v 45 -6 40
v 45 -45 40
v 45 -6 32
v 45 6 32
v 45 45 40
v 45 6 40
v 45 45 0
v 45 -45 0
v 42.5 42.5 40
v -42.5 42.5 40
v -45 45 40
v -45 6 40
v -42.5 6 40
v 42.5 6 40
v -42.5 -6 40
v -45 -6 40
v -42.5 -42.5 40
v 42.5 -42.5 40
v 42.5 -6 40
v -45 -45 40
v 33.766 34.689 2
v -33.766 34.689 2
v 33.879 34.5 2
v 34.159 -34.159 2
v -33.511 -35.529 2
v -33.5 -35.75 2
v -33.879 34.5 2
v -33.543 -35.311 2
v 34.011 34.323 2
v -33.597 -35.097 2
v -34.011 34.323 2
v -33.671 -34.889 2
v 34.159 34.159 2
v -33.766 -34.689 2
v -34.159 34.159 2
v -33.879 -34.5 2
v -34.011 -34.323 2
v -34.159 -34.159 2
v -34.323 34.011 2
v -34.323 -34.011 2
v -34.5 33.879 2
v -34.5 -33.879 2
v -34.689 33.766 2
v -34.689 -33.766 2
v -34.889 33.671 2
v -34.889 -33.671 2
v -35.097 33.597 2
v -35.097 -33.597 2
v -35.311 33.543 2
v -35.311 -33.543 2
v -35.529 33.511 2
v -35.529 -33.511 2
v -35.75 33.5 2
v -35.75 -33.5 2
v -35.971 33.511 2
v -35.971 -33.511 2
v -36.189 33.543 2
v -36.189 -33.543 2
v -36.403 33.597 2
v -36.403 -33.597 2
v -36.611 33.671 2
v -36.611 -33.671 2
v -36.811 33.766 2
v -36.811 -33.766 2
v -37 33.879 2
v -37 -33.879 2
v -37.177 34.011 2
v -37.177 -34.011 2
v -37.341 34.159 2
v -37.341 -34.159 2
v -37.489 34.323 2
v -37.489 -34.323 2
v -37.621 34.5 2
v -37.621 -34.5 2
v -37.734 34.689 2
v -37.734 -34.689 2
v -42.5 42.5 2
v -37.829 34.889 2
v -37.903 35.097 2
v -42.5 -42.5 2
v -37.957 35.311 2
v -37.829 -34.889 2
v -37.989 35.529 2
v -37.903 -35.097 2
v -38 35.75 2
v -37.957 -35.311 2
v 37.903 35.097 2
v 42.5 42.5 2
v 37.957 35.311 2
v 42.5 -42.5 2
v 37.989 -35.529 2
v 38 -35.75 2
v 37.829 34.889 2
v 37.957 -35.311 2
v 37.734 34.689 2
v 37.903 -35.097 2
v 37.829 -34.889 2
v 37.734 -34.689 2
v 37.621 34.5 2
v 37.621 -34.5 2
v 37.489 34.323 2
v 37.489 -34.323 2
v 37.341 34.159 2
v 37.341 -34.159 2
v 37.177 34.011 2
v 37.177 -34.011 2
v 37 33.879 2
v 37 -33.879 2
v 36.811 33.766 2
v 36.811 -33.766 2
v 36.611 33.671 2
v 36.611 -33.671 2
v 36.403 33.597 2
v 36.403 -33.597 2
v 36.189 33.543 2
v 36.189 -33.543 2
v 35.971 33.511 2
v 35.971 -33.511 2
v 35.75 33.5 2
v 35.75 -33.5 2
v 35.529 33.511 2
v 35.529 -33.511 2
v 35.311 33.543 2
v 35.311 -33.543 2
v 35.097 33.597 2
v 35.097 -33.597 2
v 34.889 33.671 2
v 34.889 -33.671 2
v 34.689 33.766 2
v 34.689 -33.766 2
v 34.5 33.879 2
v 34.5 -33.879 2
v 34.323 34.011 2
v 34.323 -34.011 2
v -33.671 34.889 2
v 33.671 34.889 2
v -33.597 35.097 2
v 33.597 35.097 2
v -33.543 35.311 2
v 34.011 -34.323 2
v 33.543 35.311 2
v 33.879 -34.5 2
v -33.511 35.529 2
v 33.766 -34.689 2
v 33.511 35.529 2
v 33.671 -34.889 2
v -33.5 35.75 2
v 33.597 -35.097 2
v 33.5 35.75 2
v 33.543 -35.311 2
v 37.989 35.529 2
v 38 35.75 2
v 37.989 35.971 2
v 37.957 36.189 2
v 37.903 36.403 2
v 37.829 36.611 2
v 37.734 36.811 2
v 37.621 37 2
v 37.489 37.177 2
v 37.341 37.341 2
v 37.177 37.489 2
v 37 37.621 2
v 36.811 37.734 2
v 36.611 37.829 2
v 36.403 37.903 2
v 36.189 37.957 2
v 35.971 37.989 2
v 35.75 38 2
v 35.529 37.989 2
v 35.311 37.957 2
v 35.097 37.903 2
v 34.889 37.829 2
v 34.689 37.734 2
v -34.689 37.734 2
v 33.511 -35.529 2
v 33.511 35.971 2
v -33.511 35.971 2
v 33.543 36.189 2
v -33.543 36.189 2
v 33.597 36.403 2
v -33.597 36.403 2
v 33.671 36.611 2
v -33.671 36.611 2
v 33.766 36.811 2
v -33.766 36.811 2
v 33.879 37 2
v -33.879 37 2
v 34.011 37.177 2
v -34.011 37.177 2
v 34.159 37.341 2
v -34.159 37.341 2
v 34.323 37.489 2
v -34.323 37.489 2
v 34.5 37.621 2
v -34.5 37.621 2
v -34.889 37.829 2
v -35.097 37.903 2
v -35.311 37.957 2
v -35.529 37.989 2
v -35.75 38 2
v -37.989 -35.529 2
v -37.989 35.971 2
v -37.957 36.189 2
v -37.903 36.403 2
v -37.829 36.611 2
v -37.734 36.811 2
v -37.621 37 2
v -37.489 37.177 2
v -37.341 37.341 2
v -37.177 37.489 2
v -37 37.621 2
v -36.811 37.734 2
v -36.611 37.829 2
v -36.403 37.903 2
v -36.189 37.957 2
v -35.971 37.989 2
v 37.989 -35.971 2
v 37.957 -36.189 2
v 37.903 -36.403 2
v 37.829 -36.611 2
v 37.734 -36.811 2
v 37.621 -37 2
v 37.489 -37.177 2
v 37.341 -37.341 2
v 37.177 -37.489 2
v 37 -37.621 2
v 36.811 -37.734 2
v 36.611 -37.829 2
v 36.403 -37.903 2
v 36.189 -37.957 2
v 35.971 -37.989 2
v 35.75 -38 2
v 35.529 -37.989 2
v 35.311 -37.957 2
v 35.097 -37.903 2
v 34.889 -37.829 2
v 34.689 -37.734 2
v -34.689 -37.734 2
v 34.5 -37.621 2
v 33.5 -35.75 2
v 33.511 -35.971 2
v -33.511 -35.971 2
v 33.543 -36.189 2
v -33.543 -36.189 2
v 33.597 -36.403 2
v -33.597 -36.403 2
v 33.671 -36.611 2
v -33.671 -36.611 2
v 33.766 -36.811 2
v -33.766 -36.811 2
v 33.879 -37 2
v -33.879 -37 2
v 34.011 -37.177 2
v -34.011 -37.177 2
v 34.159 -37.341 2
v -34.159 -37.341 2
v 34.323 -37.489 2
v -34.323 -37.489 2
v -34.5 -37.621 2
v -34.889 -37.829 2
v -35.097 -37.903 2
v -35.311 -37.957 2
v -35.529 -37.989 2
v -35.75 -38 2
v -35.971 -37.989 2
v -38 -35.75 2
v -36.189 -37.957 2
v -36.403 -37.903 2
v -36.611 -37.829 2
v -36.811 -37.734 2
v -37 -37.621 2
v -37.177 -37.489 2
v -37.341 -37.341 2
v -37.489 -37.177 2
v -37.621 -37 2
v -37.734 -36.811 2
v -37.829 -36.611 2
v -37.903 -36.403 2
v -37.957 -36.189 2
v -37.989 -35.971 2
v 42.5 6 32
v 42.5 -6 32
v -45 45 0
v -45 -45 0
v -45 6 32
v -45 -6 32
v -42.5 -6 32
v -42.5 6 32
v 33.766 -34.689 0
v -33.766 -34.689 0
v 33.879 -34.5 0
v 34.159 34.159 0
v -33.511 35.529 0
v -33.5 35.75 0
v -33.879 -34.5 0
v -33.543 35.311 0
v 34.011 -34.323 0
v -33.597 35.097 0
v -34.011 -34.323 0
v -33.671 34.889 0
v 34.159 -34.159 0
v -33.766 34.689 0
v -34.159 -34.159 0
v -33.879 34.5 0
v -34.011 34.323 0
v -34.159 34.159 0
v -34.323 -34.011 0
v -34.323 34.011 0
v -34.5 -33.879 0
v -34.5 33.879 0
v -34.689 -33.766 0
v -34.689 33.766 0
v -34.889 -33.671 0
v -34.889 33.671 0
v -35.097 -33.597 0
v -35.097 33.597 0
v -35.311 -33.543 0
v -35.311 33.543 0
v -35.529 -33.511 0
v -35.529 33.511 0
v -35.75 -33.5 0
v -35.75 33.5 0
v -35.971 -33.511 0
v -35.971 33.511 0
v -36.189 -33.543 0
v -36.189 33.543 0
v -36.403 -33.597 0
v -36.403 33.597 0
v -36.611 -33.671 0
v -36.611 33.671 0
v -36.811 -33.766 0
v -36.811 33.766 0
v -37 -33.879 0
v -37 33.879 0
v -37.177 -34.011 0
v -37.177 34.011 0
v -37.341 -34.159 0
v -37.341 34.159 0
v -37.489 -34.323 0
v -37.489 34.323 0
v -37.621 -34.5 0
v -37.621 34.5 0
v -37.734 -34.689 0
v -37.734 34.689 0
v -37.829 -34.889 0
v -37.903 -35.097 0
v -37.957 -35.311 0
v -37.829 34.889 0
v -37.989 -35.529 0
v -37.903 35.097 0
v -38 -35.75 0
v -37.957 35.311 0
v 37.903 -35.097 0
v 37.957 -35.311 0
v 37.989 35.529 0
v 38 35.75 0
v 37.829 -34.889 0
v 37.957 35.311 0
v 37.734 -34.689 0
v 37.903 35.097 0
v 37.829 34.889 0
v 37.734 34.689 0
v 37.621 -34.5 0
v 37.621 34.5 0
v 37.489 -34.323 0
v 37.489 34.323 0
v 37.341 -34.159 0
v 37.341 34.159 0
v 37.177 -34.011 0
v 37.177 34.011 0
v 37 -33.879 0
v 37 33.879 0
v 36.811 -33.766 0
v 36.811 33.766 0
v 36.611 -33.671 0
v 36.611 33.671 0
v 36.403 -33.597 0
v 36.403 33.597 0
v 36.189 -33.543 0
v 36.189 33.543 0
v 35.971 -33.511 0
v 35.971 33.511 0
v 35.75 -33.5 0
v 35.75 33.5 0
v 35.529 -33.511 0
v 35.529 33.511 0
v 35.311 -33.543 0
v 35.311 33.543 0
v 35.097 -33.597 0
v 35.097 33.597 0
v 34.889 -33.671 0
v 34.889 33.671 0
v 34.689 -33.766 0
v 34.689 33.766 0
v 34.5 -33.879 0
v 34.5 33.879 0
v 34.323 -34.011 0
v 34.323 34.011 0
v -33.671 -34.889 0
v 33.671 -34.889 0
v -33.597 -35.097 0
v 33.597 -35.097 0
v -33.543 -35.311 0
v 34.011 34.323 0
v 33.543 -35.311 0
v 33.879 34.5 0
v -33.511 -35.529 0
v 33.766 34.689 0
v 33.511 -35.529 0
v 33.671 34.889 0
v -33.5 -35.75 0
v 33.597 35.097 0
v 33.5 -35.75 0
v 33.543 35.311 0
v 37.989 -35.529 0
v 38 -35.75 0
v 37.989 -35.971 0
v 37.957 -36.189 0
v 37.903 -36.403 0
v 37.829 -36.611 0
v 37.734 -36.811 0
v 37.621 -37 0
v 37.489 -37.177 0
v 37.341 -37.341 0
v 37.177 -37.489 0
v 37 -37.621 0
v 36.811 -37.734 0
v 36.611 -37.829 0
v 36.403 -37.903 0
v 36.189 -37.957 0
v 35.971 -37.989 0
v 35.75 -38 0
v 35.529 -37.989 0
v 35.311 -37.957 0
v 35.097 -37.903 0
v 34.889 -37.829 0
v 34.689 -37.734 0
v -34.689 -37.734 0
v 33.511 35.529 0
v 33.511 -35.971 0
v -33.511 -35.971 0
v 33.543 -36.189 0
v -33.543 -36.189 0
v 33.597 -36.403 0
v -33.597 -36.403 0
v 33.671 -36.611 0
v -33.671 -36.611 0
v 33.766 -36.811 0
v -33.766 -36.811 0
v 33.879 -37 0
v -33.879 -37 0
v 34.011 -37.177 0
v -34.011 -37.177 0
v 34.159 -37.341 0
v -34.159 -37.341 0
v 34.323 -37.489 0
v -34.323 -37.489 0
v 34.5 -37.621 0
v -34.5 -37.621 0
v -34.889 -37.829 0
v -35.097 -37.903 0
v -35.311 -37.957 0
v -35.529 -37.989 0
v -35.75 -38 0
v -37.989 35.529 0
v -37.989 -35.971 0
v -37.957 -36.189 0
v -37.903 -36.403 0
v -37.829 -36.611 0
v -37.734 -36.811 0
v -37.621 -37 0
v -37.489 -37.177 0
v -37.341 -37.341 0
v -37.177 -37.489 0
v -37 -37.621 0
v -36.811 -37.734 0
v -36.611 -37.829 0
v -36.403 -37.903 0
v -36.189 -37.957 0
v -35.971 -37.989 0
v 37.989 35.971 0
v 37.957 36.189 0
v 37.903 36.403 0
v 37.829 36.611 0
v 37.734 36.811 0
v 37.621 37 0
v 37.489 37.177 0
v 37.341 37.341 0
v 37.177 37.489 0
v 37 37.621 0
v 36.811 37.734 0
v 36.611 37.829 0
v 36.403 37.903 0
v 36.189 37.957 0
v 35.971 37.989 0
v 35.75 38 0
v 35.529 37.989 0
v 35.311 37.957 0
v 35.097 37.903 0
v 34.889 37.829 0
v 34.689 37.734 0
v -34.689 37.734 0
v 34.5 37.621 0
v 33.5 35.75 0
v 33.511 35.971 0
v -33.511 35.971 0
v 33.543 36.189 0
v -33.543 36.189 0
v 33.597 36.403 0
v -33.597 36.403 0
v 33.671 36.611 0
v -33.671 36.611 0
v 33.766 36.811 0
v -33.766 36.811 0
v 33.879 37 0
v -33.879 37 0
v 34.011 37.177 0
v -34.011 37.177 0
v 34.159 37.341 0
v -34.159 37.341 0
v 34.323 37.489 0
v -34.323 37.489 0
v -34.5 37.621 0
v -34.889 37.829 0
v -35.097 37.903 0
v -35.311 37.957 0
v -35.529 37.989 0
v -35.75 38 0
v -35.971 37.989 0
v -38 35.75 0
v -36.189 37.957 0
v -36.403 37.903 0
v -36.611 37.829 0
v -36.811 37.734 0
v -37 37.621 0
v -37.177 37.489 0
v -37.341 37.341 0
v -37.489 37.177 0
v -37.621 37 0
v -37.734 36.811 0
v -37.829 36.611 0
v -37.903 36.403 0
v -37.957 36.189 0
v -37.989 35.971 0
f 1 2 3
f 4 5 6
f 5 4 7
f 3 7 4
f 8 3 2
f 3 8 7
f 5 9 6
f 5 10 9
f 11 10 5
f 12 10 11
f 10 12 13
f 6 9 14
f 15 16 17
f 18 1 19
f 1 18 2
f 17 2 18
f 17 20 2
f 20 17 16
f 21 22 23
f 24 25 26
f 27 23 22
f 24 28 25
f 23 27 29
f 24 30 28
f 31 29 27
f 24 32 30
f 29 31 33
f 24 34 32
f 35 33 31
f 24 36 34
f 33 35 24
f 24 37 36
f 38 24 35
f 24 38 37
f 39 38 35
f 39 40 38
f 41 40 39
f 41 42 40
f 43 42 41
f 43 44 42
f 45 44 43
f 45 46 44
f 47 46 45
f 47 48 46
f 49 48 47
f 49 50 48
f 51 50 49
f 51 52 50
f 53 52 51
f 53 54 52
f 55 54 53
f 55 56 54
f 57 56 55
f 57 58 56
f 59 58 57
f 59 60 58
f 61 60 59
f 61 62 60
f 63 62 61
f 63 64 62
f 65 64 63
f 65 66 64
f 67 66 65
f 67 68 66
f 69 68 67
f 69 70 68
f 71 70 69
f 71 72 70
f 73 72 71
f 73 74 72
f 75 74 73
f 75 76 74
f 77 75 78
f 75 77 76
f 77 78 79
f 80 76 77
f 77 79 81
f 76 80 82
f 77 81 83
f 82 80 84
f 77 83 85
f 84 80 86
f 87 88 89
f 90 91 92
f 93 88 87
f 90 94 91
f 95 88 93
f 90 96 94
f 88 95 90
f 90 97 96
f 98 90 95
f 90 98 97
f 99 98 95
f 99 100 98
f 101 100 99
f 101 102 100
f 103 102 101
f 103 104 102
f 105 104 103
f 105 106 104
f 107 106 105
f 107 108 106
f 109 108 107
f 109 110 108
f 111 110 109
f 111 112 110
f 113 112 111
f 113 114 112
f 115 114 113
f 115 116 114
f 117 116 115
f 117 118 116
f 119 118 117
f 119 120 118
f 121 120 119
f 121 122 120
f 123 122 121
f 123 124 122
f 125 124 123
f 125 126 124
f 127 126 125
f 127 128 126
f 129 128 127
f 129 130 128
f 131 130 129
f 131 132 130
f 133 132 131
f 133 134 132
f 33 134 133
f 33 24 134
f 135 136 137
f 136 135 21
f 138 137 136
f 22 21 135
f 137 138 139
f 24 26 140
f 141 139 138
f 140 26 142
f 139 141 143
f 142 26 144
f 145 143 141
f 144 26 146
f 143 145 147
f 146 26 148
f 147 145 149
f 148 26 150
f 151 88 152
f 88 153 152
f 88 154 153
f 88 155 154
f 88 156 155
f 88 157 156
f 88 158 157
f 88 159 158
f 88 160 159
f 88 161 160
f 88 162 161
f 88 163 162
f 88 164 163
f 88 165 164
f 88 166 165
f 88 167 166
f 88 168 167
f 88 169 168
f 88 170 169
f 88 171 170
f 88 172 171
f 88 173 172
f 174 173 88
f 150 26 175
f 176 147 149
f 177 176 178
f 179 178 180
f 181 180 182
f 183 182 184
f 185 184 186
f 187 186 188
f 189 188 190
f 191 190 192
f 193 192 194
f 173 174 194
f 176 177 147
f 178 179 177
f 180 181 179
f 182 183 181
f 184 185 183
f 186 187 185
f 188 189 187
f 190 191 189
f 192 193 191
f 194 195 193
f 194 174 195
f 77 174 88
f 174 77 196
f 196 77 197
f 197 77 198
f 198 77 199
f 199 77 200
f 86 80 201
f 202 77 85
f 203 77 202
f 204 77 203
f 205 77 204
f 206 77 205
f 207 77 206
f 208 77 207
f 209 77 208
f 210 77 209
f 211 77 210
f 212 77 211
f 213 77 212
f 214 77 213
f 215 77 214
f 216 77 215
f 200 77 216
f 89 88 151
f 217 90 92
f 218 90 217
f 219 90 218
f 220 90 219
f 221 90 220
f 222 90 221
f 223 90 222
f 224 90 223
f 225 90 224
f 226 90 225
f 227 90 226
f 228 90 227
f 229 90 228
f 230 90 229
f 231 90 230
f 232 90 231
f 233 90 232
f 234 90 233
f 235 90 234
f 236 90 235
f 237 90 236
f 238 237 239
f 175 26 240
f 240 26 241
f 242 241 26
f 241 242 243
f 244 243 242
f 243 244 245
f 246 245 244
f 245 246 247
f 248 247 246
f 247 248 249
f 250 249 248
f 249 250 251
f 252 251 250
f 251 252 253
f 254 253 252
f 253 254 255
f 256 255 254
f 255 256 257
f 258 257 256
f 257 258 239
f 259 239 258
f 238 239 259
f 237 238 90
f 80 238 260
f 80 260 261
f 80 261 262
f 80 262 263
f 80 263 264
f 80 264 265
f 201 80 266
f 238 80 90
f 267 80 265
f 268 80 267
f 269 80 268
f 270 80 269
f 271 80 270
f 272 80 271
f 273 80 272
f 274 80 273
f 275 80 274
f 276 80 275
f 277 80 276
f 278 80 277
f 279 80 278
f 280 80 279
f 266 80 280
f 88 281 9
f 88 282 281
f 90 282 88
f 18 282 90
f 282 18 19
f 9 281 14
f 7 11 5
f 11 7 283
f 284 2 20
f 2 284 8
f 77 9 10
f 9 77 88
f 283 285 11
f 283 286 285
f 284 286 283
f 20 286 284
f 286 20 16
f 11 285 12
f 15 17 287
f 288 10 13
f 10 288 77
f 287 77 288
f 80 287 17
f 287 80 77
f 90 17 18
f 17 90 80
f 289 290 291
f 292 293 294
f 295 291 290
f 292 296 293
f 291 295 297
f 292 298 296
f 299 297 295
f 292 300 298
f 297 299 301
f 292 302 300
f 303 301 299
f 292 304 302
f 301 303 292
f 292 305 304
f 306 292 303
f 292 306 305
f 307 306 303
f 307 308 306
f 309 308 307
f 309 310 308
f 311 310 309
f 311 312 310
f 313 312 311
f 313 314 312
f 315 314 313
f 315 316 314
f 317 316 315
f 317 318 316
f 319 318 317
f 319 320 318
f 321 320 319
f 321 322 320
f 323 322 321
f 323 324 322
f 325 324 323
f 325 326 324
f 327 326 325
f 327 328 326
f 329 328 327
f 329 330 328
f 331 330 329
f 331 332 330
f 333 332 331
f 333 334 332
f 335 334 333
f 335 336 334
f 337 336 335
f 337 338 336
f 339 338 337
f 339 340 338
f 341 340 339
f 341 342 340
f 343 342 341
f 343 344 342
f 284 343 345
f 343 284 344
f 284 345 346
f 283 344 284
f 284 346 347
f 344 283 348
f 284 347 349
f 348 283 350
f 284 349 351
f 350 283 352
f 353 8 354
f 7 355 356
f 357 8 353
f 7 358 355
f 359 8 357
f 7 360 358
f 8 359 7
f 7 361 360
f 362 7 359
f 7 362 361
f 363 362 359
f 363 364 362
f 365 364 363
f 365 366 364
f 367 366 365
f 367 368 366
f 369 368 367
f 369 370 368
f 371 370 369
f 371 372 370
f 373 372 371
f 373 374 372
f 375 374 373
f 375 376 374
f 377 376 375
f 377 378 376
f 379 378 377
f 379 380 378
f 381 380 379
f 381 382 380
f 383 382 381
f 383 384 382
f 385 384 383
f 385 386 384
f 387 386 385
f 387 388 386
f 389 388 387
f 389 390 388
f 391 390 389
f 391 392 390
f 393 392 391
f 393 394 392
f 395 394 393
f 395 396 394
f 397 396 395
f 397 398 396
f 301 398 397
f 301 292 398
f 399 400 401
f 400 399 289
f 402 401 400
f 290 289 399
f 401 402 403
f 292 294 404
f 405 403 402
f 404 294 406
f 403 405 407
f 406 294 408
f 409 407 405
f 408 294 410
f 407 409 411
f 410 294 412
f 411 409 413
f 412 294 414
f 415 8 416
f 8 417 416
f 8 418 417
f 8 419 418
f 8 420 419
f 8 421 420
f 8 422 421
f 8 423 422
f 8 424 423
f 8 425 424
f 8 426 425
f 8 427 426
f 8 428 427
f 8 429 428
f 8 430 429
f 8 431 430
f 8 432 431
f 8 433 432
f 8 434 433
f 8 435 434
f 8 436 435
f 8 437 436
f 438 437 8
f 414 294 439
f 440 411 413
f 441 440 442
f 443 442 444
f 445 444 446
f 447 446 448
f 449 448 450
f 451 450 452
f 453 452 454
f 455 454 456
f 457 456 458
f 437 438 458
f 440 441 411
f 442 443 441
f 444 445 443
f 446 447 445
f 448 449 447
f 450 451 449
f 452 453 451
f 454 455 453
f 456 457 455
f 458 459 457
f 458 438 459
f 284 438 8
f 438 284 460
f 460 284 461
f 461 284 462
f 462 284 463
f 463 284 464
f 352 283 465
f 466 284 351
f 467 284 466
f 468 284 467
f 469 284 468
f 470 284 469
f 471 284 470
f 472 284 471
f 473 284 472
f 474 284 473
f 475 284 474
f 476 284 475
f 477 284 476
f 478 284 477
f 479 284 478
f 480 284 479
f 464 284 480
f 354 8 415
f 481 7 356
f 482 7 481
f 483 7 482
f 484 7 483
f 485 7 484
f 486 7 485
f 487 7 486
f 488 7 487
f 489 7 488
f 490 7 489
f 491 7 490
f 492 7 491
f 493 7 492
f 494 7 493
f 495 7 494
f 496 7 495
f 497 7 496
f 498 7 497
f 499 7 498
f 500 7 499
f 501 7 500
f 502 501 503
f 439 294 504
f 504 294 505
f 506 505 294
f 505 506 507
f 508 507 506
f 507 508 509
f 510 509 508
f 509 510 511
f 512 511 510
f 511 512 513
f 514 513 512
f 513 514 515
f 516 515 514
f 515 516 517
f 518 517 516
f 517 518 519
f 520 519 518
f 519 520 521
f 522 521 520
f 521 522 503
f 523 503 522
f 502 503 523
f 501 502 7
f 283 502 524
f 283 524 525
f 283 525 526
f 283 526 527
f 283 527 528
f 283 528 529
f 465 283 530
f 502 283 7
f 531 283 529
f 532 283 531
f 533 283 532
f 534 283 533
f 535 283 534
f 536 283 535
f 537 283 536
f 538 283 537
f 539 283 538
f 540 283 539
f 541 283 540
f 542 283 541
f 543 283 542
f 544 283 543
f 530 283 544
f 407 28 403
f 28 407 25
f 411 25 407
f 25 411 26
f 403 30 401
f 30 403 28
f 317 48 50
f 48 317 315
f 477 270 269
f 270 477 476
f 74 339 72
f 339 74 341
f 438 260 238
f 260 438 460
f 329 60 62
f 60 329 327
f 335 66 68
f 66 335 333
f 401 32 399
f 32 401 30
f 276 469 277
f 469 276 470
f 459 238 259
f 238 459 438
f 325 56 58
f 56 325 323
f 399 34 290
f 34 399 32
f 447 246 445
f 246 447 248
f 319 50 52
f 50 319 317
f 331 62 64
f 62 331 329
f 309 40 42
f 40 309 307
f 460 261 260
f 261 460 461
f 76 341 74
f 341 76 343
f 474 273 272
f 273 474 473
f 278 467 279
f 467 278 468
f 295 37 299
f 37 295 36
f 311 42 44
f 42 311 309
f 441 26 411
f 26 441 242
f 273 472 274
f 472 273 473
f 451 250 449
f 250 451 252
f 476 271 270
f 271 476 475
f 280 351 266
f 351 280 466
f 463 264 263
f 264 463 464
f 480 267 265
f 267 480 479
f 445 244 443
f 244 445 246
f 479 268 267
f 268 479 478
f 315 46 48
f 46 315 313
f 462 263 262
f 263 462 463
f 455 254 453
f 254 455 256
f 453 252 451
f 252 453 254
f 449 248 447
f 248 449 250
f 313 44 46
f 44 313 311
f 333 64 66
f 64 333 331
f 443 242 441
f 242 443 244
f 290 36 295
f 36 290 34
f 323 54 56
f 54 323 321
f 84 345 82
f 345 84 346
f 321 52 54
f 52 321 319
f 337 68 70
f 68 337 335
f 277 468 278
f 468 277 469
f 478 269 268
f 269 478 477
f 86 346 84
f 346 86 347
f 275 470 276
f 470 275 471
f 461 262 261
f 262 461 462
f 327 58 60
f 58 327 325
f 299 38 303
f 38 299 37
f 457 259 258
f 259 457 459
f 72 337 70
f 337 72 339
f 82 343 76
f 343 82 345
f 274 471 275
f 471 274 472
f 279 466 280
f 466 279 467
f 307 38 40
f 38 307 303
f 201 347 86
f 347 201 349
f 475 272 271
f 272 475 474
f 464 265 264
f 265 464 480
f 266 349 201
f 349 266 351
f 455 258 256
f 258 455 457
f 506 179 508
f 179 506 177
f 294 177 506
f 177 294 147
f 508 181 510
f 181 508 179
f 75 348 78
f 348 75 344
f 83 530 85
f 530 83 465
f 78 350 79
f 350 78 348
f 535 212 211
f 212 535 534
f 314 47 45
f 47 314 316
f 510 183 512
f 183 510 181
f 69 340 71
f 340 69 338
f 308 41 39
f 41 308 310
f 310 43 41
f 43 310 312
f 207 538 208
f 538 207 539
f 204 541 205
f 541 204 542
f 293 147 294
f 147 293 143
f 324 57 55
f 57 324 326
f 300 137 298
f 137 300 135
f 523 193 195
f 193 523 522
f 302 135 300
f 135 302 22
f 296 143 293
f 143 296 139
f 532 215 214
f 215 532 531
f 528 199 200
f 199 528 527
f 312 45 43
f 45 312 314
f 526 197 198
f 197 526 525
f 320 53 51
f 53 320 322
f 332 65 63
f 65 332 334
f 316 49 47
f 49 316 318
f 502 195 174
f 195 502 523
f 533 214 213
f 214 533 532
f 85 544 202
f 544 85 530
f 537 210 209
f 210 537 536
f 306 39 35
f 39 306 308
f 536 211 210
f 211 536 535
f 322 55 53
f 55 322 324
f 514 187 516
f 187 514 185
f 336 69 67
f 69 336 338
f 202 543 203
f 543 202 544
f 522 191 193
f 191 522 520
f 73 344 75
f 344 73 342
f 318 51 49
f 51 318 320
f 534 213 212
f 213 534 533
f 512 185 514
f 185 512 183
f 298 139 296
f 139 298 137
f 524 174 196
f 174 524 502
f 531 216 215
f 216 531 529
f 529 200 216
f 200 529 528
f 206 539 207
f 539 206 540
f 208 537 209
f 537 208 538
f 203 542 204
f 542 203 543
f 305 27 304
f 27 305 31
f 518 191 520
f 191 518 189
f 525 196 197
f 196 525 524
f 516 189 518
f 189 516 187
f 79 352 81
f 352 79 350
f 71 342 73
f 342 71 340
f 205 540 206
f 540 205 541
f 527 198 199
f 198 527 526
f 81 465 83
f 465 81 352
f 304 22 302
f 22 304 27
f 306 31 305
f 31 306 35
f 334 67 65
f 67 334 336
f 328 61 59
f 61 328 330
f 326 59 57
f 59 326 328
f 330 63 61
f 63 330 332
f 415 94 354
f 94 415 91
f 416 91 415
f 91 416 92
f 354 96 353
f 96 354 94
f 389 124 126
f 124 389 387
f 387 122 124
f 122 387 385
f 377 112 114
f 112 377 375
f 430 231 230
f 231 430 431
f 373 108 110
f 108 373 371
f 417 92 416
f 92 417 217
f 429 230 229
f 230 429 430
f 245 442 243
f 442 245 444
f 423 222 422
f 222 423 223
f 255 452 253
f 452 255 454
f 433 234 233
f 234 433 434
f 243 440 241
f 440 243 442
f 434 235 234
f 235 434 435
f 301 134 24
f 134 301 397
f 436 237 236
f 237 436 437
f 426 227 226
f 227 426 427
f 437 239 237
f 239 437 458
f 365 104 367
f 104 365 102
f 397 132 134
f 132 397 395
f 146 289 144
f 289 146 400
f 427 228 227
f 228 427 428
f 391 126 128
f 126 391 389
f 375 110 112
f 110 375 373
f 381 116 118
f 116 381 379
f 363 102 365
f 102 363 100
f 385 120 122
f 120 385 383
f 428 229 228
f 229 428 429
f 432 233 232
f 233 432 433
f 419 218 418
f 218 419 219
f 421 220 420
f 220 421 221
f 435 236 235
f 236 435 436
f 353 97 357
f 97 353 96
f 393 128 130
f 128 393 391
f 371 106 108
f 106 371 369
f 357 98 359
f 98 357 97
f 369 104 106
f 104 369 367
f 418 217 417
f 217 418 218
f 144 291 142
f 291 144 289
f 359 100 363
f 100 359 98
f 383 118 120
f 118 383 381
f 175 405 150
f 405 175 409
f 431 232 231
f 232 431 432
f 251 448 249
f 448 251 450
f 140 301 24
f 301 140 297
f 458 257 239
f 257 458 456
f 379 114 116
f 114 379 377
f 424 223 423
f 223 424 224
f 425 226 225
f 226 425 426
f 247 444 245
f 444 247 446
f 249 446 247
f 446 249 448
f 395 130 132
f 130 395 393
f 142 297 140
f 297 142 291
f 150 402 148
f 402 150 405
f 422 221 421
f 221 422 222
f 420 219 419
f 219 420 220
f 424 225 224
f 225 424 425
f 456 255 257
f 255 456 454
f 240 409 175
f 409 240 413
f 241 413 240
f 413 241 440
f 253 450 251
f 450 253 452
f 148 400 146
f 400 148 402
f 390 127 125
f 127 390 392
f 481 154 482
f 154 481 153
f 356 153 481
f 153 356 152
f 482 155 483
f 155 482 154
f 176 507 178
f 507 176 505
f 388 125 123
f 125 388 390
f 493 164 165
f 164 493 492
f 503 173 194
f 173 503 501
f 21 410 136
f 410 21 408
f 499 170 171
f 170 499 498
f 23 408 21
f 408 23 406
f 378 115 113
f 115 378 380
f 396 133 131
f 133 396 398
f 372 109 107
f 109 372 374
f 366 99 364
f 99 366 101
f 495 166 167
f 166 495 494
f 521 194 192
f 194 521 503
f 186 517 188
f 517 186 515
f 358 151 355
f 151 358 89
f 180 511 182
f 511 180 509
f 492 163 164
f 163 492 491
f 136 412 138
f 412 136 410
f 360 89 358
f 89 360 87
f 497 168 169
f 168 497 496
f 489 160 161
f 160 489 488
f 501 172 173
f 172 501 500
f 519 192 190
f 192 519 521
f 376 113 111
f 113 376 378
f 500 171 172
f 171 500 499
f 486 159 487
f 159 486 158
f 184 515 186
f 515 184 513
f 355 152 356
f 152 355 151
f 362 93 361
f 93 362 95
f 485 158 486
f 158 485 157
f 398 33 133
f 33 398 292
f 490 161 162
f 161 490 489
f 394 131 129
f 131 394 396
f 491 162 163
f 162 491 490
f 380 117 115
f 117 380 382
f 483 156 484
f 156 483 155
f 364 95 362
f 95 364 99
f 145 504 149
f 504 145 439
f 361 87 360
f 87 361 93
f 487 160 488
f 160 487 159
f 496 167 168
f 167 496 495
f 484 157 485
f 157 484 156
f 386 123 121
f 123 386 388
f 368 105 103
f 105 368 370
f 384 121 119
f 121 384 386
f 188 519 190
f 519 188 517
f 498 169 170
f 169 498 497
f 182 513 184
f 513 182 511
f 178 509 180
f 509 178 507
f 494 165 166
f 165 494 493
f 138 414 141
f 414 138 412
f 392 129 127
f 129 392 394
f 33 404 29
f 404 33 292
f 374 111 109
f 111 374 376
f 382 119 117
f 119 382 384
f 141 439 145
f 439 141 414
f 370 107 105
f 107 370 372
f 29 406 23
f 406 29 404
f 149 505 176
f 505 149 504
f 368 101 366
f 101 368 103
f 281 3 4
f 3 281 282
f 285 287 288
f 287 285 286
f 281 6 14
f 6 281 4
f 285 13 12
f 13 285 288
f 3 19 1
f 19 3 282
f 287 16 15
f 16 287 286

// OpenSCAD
// Magnetic stirrer housing for 80 mm PC case fan
// Print orientation: top plate on bed (z = 0), walls rise to open top (z = 40)

// ---------- Parameters ----------
plate_t      = 2;     // top plate thickness
wall_t       = 2.5;   // wall thickness
open_top_z   = 40;    // height of open top
outer_size   = 90;    // outer X and Y size of box
screw_hole   = 4.5;   // M4 screw hole diameter
screw_pitch  = 71.5;  // square pattern pitch for screw holes
cable_notch_w = 12;   // cable notch width
cable_notch_d = 8;    // cable notch depth from open edge
eps          = 0.5;   // cutter overshoot past faces

$fn = 64;

// ---------- Model ----------
difference() {
    // Main box body
    union() {
        // Top plate
        translate([-outer_size/2, -outer_size/2, 0])
            cube([outer_size, outer_size, plate_t]);
        // Walls
        for (a = [0, 90, 180, 270])
            rotate([0, 0, a])
                translate([outer_size/2 - wall_t, -outer_size/2, plate_t])
                    cube([wall_t, outer_size, open_top_z - plate_t]);
    }

    // Screw holes through top plate
    for (x = [-screw_pitch/2, screw_pitch/2])
        for (y = [-screw_pitch/2, screw_pitch/2])
            translate([x, y, -eps])
                cylinder(d = screw_hole, h = plate_t + 2*eps);

    // Cable notch in one wall (centred along Y, from z = 32 to z = 40)
    translate([-outer_size/2, -cable_notch_w/2, open_top_z - cable_notch_d])
        cube([outer_size, cable_notch_w, cable_notch_d + eps]);
}
